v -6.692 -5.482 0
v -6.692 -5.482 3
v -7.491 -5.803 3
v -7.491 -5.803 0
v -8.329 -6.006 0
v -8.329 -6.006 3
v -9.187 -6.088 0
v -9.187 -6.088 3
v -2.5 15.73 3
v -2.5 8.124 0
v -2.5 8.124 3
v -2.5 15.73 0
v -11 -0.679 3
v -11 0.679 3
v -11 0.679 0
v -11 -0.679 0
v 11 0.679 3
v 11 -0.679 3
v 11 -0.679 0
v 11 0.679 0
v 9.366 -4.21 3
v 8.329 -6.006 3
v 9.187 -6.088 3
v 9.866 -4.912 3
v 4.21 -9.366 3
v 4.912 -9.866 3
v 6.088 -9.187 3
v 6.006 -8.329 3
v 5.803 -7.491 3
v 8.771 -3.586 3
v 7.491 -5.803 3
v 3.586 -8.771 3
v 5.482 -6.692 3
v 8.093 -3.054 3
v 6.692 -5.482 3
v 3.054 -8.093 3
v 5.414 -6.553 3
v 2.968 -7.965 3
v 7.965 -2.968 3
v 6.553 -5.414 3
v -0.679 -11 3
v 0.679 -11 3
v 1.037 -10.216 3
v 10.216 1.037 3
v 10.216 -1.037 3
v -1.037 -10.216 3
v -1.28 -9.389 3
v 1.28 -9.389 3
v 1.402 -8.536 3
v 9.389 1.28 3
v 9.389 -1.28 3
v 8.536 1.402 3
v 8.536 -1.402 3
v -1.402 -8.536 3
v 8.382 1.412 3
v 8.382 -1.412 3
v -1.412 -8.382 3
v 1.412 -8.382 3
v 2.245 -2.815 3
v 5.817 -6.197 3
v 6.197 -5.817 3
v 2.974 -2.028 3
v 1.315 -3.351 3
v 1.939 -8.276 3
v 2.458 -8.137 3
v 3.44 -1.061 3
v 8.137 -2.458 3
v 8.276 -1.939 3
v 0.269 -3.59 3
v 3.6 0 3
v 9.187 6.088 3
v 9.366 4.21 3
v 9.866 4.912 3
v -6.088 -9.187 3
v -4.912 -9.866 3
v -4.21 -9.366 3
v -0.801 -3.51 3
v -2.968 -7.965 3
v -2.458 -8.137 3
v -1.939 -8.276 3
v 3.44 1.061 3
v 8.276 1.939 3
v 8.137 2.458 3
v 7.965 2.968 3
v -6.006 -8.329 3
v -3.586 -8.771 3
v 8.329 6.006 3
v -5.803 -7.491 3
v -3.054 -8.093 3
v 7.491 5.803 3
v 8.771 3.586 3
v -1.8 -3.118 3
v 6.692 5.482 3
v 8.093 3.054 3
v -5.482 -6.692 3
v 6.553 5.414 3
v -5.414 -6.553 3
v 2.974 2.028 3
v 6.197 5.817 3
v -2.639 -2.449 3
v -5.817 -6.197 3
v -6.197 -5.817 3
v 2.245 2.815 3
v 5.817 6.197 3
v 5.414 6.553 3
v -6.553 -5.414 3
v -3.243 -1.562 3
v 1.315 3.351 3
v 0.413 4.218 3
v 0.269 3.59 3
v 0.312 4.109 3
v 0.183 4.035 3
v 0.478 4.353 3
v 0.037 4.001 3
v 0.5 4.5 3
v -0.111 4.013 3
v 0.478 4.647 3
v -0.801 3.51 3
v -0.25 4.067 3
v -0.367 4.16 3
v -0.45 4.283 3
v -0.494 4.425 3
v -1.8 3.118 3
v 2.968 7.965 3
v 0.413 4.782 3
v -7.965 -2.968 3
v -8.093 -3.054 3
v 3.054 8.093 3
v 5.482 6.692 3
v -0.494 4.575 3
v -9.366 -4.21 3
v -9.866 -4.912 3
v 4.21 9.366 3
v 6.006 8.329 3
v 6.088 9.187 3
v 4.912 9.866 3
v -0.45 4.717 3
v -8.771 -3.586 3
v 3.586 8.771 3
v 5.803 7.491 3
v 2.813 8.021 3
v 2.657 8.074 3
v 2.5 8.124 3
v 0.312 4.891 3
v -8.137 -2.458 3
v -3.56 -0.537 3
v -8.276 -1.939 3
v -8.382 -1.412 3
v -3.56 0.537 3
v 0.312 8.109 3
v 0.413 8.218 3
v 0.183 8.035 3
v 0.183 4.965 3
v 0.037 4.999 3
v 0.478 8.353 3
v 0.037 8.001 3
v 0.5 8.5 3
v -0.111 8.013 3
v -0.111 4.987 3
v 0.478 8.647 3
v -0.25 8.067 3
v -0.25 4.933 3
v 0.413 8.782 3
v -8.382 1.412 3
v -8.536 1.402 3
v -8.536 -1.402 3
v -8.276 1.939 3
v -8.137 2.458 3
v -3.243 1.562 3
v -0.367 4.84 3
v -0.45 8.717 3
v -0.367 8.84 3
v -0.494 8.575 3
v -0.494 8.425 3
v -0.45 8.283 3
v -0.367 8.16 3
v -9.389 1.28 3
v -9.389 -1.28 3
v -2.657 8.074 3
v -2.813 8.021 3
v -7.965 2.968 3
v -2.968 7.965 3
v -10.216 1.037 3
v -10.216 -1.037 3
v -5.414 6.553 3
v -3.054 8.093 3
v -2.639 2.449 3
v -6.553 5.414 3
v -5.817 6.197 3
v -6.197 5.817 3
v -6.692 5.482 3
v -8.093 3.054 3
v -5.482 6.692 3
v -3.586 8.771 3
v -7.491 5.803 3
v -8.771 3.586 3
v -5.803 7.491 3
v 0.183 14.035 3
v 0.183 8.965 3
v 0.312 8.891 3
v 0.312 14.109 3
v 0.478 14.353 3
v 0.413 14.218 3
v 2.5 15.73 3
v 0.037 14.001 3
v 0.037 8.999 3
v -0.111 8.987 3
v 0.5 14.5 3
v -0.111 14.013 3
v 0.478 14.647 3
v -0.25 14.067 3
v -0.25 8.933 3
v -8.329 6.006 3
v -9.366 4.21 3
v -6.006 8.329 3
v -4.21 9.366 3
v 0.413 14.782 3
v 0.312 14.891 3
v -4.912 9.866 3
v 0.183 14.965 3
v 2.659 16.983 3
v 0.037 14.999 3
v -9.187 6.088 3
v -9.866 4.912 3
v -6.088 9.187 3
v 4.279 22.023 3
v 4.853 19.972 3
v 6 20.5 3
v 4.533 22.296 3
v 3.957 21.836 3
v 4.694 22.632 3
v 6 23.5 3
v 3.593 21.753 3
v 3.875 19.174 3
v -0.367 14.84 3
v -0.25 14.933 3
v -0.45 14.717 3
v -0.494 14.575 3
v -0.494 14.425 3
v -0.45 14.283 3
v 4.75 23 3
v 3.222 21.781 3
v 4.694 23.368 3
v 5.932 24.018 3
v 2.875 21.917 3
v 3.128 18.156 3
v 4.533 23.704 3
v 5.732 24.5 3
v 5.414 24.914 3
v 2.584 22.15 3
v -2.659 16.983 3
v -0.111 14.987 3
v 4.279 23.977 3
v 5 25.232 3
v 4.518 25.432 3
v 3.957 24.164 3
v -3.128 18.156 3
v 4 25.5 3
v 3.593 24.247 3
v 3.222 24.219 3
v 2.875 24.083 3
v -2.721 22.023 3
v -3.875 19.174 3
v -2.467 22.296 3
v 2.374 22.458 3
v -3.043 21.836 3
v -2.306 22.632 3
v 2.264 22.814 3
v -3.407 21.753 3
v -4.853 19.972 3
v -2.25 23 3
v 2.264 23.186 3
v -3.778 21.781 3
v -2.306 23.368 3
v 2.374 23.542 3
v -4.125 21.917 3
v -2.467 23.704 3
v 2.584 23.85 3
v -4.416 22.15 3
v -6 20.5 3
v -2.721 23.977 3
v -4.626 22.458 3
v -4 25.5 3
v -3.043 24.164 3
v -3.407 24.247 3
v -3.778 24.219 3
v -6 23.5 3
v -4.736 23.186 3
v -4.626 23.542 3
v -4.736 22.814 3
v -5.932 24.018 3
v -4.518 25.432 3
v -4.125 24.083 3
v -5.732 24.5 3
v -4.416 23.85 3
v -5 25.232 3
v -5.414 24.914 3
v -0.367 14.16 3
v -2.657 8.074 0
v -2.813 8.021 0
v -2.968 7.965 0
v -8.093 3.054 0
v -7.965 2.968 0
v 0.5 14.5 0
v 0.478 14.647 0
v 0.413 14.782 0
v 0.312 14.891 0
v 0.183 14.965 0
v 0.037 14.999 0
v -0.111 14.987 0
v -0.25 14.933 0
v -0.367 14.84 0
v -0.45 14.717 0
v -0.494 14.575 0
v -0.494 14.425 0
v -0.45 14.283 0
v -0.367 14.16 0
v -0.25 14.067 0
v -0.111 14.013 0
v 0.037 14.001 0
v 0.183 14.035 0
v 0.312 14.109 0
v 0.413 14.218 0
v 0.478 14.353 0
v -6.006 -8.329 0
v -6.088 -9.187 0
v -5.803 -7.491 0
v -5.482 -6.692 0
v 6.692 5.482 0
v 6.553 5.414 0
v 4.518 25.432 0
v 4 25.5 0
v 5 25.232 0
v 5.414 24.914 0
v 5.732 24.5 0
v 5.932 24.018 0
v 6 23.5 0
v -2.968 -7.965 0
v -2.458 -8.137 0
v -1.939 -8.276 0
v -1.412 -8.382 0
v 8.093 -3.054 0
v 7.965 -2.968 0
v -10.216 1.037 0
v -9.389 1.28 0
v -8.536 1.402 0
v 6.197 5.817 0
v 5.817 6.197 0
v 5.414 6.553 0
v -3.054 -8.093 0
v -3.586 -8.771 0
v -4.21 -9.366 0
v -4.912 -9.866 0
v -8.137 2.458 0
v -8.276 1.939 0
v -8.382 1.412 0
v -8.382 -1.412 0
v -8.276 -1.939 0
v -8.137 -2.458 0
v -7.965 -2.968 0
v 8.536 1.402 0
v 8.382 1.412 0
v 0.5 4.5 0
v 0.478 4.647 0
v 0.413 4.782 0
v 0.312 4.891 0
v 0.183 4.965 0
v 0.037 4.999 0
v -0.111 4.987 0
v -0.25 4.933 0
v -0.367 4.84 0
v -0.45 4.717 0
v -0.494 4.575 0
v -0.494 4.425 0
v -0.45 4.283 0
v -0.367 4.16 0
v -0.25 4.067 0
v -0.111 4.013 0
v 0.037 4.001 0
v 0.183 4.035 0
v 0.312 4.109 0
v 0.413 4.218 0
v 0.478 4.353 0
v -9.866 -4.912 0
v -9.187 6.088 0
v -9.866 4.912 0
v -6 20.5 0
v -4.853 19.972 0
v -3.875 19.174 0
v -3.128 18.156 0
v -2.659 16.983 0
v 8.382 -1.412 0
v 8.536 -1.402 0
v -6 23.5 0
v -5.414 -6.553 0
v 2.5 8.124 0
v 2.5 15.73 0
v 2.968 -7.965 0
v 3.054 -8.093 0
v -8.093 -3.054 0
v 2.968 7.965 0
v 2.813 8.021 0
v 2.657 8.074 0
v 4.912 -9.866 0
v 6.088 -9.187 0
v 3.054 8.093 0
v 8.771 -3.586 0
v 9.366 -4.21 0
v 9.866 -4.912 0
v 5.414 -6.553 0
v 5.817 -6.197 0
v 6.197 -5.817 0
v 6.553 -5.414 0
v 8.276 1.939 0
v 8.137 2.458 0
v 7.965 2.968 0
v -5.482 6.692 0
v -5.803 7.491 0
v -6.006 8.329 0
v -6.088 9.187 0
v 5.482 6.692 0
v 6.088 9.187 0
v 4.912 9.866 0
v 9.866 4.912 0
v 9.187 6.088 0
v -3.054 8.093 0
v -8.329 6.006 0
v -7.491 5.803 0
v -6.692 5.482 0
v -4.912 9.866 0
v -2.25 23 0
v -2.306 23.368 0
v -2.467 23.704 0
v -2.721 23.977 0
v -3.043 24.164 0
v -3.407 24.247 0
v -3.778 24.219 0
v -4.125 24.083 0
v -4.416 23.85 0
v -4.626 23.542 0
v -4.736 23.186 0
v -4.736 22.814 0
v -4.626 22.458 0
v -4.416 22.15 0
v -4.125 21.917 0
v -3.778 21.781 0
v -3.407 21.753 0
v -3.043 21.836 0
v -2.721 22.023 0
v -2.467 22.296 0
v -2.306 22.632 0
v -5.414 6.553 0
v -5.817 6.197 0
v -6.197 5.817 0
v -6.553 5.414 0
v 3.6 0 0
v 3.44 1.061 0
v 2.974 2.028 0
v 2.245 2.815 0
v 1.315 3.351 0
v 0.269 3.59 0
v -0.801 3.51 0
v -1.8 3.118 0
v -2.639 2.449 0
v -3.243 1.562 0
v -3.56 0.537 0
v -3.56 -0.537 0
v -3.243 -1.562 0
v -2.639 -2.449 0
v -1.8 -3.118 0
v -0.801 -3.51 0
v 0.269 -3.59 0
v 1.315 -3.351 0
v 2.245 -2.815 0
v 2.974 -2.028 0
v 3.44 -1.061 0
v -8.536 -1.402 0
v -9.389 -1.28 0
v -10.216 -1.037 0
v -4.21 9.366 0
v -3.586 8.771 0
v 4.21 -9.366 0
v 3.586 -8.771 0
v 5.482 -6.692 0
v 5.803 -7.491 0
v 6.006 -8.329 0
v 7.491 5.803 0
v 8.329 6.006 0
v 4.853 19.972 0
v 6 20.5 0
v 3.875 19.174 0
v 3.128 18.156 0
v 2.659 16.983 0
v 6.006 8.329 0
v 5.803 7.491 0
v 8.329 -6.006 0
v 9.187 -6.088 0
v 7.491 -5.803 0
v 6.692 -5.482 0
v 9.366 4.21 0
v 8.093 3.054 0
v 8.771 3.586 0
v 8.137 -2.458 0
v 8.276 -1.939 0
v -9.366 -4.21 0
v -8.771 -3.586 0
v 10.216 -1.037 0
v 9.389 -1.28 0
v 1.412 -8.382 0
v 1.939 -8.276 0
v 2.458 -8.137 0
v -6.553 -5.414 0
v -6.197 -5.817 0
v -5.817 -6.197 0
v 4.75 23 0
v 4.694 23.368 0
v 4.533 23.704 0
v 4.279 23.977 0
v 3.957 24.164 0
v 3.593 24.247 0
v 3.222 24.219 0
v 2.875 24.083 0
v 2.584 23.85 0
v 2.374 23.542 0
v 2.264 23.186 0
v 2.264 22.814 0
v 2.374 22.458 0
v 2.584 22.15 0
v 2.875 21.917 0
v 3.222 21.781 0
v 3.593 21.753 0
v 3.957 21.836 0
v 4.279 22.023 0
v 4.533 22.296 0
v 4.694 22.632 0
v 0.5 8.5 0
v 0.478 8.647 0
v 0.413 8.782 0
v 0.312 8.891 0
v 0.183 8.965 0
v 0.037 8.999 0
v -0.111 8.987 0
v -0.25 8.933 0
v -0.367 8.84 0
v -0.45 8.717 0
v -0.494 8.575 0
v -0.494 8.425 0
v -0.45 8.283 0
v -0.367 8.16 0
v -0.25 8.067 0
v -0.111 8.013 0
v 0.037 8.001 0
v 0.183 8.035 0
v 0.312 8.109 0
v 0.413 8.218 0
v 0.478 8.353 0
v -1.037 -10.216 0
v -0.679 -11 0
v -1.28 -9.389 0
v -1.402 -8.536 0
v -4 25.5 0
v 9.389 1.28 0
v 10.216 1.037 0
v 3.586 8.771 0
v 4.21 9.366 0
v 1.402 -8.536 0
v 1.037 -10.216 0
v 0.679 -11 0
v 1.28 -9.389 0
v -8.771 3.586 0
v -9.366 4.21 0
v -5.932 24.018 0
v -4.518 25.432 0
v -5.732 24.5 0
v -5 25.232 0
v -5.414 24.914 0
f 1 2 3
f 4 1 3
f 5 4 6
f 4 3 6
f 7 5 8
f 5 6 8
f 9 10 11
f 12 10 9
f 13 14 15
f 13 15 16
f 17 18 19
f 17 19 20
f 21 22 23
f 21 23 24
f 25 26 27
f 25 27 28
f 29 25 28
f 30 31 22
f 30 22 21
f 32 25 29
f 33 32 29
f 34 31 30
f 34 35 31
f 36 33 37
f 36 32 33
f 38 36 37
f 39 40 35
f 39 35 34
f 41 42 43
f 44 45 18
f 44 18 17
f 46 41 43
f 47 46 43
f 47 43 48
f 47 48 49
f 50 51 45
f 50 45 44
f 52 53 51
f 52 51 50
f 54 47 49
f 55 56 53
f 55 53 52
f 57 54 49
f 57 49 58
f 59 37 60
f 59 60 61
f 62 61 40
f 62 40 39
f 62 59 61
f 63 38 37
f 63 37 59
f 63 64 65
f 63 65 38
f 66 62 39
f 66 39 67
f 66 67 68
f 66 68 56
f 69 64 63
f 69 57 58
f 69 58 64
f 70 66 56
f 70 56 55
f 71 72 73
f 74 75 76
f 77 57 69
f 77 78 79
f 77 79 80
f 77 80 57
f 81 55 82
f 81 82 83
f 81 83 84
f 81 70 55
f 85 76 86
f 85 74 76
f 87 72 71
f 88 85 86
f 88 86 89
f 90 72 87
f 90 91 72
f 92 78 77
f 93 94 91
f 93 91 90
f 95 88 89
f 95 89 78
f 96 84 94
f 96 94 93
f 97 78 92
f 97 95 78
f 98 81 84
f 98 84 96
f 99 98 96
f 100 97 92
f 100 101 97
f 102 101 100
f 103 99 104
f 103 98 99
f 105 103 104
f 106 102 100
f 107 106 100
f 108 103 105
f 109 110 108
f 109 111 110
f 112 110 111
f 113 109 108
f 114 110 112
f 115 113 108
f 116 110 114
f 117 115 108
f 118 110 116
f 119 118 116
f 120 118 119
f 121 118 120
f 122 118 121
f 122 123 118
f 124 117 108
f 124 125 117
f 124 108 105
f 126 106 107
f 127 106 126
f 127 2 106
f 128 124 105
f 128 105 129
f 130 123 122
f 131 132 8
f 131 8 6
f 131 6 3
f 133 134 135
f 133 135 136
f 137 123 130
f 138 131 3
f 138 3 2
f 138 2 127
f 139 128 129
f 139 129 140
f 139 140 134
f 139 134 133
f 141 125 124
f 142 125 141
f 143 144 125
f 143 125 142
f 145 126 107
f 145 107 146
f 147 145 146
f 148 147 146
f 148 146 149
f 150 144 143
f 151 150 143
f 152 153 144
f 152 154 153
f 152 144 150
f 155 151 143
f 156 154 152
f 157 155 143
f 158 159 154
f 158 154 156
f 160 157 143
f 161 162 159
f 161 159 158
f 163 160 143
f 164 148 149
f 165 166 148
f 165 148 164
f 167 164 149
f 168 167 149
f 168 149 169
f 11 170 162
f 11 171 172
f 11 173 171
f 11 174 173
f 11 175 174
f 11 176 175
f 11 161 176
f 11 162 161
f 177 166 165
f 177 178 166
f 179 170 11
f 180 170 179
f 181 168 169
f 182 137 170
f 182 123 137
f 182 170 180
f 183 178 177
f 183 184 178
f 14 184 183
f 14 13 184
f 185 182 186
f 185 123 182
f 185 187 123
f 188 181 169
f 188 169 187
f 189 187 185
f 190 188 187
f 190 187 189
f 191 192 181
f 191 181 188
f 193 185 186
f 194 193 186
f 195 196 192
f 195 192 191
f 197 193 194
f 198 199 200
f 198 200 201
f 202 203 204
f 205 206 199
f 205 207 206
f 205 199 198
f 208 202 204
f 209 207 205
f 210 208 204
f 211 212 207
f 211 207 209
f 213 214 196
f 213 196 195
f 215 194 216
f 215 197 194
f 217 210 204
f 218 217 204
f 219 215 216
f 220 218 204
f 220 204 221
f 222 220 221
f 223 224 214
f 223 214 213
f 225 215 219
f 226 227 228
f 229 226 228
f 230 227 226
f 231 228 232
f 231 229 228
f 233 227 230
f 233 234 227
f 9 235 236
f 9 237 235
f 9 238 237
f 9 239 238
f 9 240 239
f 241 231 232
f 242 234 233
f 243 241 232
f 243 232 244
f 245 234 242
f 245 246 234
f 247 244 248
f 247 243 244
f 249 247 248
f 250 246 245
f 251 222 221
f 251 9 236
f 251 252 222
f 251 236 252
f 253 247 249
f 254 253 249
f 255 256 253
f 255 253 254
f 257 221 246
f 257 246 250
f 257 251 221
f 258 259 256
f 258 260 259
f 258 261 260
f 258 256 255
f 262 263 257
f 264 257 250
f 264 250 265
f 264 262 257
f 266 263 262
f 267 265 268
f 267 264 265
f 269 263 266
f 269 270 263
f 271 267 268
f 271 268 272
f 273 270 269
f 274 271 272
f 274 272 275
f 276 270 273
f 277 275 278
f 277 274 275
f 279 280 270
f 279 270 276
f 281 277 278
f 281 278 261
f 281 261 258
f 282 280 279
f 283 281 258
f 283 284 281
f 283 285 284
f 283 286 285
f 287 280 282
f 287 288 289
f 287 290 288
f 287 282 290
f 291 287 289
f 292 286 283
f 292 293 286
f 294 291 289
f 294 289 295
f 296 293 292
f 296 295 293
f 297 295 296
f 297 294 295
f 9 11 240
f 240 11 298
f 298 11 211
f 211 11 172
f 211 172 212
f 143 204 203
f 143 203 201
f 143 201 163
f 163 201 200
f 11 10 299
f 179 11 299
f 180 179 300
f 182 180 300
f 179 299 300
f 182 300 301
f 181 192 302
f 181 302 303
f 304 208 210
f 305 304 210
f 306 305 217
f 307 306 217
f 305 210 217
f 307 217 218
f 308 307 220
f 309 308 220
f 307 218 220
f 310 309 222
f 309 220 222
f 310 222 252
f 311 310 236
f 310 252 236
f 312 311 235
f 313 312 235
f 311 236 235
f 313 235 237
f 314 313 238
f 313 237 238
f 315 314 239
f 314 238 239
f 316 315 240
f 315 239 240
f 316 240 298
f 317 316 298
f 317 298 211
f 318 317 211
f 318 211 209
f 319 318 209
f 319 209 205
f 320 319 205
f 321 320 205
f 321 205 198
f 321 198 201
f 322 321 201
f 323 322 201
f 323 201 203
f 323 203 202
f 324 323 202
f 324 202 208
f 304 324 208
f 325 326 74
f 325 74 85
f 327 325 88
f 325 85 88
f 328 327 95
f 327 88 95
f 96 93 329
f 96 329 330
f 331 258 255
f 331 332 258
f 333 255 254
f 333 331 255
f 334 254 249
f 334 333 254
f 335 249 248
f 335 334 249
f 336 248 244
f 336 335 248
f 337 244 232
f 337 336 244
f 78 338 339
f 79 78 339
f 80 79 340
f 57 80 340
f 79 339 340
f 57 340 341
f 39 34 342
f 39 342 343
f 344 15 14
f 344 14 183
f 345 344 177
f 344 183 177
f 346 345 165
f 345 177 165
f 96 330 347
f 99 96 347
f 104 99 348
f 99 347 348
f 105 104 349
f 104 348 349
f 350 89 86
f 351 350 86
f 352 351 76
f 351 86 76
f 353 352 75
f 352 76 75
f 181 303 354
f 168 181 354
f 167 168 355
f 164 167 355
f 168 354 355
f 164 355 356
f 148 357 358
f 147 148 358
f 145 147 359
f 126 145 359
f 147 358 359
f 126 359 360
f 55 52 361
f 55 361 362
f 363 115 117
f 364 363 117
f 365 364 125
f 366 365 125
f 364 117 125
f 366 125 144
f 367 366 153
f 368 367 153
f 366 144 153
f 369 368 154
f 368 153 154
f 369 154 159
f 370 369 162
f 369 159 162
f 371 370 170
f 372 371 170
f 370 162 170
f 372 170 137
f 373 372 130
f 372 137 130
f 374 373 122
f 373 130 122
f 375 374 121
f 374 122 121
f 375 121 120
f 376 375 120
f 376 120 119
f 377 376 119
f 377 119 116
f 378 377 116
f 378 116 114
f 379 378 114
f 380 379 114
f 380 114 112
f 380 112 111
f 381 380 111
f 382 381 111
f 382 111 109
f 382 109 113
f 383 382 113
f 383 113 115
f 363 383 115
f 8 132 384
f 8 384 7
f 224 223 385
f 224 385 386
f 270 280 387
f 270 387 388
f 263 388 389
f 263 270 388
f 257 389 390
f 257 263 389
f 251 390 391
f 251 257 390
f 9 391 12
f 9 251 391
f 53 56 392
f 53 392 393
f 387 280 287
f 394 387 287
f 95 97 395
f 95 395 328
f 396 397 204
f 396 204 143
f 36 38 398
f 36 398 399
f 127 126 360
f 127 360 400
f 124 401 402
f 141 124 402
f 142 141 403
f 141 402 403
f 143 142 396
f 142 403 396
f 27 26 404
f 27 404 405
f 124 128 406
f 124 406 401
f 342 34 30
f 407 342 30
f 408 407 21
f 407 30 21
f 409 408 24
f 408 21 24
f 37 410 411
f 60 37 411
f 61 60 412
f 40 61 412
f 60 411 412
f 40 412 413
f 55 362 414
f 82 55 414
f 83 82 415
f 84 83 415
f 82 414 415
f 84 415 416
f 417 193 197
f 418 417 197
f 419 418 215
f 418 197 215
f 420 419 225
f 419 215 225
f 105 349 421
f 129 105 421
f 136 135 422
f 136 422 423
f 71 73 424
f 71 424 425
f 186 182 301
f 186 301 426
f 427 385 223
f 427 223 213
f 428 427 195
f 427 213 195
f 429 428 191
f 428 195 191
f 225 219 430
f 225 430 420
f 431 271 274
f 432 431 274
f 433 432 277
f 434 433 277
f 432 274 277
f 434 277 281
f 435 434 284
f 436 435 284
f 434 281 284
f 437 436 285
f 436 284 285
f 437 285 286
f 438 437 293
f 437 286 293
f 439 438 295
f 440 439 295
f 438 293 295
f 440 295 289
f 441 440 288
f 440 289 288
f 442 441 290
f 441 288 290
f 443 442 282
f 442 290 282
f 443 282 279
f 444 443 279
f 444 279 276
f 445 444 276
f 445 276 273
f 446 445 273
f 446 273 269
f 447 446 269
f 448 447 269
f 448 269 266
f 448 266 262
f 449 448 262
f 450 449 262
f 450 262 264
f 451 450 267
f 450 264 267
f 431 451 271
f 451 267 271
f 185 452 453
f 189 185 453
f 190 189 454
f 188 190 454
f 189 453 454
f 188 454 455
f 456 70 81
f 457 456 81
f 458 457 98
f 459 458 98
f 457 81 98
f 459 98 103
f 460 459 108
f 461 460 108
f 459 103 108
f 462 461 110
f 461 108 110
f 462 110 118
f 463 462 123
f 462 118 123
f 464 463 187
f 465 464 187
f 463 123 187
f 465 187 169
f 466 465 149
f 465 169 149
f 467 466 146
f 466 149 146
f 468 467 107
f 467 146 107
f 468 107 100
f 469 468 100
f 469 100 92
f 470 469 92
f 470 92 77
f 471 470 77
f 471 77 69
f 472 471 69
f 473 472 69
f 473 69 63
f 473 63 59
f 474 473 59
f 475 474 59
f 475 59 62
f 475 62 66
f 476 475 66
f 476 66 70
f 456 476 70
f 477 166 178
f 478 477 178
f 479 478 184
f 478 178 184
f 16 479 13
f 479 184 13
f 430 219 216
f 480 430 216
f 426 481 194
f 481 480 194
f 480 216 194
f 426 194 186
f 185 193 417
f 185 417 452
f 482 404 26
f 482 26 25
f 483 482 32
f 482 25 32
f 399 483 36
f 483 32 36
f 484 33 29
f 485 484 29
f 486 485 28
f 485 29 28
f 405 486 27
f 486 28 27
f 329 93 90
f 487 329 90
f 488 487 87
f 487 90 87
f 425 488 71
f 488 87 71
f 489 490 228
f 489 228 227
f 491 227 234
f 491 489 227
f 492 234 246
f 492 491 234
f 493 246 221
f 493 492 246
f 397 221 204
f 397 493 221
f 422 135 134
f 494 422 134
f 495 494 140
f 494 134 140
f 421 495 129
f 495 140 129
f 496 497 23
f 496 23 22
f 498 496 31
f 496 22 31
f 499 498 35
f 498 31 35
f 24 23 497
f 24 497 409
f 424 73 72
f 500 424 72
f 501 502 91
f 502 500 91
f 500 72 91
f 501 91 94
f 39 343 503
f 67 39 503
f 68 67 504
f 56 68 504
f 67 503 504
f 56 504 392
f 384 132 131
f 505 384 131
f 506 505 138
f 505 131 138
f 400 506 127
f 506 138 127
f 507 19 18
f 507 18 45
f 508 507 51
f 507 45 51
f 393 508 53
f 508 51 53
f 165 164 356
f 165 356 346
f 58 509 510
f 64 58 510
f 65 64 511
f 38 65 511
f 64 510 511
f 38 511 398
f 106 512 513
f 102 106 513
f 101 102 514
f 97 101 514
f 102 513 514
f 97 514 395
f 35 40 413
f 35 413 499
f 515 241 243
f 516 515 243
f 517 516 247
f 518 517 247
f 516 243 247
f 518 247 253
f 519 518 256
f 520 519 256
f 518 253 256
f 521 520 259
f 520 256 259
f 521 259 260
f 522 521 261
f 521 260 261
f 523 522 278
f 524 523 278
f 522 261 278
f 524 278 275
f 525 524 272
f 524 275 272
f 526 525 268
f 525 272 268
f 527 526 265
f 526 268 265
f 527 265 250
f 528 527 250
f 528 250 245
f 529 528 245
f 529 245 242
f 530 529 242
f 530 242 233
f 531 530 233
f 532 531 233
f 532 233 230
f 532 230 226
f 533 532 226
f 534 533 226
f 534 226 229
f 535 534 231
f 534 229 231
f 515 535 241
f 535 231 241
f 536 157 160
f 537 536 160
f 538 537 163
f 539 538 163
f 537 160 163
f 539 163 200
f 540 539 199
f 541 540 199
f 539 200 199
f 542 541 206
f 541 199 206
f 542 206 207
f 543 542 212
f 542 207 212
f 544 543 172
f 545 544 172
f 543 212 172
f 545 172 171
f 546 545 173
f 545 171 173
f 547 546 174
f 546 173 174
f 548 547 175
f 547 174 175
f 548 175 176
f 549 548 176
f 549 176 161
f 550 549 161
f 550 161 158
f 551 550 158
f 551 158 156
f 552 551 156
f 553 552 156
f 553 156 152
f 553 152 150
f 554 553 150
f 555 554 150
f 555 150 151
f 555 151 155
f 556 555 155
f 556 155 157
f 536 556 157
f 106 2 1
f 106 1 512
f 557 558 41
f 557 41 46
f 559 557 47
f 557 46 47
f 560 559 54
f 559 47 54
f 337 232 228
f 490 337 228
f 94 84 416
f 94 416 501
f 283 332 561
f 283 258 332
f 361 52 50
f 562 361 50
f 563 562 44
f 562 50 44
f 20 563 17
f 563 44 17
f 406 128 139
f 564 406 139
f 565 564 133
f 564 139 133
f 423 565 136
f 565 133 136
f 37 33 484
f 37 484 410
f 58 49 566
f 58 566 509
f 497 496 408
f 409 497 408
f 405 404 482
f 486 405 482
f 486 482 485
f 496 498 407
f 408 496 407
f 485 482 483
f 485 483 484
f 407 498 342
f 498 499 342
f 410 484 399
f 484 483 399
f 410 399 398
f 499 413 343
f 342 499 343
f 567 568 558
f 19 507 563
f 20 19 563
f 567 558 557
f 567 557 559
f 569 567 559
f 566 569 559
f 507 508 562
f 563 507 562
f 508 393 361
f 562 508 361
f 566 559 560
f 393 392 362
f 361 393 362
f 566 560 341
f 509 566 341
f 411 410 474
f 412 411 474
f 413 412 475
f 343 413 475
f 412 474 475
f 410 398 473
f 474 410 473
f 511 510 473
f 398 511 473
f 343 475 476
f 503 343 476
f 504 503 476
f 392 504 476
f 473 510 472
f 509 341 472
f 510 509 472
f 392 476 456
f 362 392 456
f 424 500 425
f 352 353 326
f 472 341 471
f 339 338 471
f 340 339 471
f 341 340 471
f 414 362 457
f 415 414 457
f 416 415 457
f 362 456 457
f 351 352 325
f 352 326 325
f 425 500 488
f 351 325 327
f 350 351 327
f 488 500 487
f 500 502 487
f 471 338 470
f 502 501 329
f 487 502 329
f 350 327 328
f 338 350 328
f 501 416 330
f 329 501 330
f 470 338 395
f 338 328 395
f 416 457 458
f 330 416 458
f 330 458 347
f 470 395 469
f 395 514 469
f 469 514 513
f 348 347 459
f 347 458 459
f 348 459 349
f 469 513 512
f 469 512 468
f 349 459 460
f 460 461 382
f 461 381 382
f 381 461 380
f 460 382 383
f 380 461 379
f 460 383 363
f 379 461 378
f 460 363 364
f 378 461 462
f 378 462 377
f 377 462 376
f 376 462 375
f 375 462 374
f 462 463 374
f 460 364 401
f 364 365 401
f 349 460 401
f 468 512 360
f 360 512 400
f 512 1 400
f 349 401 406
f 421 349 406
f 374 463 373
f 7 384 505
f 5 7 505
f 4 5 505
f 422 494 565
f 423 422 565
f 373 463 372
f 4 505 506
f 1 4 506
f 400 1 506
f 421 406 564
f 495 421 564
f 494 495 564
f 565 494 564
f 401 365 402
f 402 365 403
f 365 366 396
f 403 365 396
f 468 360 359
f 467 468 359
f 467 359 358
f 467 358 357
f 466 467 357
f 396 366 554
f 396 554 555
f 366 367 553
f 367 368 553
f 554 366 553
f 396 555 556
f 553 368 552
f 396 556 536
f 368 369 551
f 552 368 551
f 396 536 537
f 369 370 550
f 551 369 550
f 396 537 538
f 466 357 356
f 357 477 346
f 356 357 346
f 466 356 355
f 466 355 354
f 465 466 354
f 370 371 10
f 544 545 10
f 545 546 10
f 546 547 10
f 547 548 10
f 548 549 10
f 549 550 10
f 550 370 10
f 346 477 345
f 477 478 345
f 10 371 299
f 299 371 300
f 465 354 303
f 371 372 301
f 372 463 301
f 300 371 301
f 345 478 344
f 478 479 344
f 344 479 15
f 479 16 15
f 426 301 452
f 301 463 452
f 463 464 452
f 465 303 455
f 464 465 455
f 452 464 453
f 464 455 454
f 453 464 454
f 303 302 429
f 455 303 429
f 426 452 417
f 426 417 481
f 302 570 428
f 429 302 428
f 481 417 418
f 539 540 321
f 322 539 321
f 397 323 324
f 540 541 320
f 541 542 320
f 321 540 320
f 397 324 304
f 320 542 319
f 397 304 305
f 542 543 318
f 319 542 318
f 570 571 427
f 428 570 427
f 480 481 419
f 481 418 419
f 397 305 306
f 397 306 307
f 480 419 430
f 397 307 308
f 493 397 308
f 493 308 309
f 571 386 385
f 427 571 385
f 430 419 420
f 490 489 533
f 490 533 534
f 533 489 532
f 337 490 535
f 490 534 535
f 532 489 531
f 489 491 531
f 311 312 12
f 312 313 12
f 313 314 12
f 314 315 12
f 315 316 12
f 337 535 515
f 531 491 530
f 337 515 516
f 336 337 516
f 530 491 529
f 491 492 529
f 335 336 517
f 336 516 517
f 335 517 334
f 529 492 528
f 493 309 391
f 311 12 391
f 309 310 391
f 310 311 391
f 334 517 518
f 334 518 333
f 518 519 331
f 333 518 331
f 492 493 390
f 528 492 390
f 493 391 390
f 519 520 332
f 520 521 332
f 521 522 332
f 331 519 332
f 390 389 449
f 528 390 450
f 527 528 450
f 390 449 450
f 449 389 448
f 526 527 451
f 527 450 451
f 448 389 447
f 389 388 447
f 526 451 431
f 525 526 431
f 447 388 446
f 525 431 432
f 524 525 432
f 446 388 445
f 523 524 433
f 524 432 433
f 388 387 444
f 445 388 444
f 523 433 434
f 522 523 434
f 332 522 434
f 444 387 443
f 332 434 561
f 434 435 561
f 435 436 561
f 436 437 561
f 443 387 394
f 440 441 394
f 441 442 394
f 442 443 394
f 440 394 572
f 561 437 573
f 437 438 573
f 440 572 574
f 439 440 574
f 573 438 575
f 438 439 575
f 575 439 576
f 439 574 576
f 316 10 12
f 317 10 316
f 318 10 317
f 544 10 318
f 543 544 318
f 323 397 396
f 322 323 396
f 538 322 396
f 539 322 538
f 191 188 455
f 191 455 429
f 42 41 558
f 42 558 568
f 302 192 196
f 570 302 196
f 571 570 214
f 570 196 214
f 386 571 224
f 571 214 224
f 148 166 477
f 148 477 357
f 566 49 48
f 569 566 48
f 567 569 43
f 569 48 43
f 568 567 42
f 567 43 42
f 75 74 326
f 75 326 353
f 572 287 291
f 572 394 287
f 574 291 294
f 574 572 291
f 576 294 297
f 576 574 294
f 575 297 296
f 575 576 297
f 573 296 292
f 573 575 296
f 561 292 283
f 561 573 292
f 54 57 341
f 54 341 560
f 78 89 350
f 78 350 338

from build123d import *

# Parameters (mm, degrees)
SKETCH1_R           = 8.5
BOSS_EXTRUDE1_DEPTH = 3
BOSS_EXTRUDE2_DEPTH = 3
CIRPATTERN2_COUNT   = 12
FILLET5_R           = 6
FILLET6_R           = 6
BOSS_EXTRUDE3_DEPTH = 3
FILLET9_R           = 2.5
SKETCH20_R          = 3.6
CUT_EXTRUDE11_DEPTH = 10
SKETCH21_R          = 0.5
CUT_EXTRUDE12_DEPTH = 10
BOSS_EXTRUDE4_DEPTH = 3
SKETCH23_R          = 1.25
CUT_EXTRUDE13_DEPTH = 3
FILLET10_R          = 5
FILLET11_R          = 2


# Some blends are built 0.0001 mm under size
with BuildPart() as part:
    # Sketch1 → Boss-Extrude1 (new body)
    with BuildSketch(Plane.XY):
        Circle(SKETCH1_R)
    extrude(amount=BOSS_EXTRUDE1_DEPTH)

    # Sketch3 → Boss-Extrude2 (add)
    with BuildSketch(Plane.XY.offset(3)):
        Polygon((-1.305261922, 9.914448614), (-1.509060022, 7), (1.509060022, 7), (1.305261922, 9.914448614), (0.678518537, 11), (-0.678518537, 11), align=None)
    boss_extrude2 = extrude(amount=-BOSS_EXTRUDE2_DEPTH)

    # CirPattern2: Boss-Extrude2 ×12 about axis
    cirpattern2_axis = Axis((0, 0, 0), (0, 0, 1))
    for i in range(1, CIRPATTERN2_COUNT):
        add(boss_extrude2.rotate(cirpattern2_axis, i * 360 / CIRPATTERN2_COUNT))

    # Fillet5
    # the kernel refuses this fillet: 6 mm, written as the material it takes off along each edge
    with BuildSketch(Plane(origin=(9.238795325, 3.826834324, 6.454382408), x_dir=(0.4999999999998129, 0.8660254037845467, 0), z_dir=(0, 0, -1)), Plane(origin=(1.305261922, 9.914448614, 6.454382408), x_dir=(-0.5000000000001841, 0.8660254037843323, 0), z_dir=(0, 0, -1)), Plane(origin=(-7.933533403, 6.08761429, 6.454382408), x_dir=(-1, 0, 0), z_dir=(0, 0, -1)), Plane(origin=(-9.914448614, 1.305261922, 6.454382408), x_dir=(-0.8660254037843317, -0.5000000000001852, 0), z_dir=(0, 0, -1)), Plane(origin=(-9.238795325, -3.826834324, 6.454382408), x_dir=(-0.49999999999981826, -0.8660254037845436, 0), z_dir=(0, 0, -1)), Plane(origin=(-6.08761429, -7.933533403, 6.454382408), x_dir=(0, -1, 0), z_dir=(0, 0, -1)), Plane(origin=(3.826834324, -9.238795325, 6.454382408), x_dir=(0.866025403784545, -0.49999999999981576, 0), z_dir=(0, 0, -1)), Plane(origin=(7.933533403, -6.08761429, 6.454382408), x_dir=(1, 0, 0), z_dir=(0, 0, -1)), Plane(origin=(9.914448614, -1.305261922, 6.454382408), x_dir=(0.8660254037843321, 0.5000000000001844, 0), z_dir=(0, 0, -1))) as fillet5_piece_1:
        with BuildLine():
            CenterArc((1.388315544, -5.998484909), FILLET5_R, 91.287628333, 24.712371667)
            Line((-1.241911337, -0.605720631), (-1.294515874, -0.497865346))
            Line((-1.294515874, -0.497865346), (-0.052604538, 0.107855286))
            Line((-0.052604538, 0.107855286), (0, 0.12))
            ThreePointArc((0, 0.12), (0.626743385, 0.12), (1.250790195, 0.119969698))
            Line((1.250790195, 0.119969698), (1.25348677, 0))
        make_face()
    extrude(amount=9.908764816, mode=Mode.SUBTRACT)
    with BuildSketch(Plane(origin=(6.08761429, 7.933533403, 6.454382408), x_dir=(-0.4383711467890806, -0.8987940462991654, 0), z_dir=(0, 0, -1)), Plane(origin=(-3.826834324, 9.238795325, 6.454382408), x_dir=(0.5591929034707435, -0.8290375725550441, 0), z_dir=(0, 0, -1)), Plane(origin=(-1.305261922, -9.914448614, 6.454382408), x_dir=(-0.06975647374412178, 0.9975640502598244, 0), z_dir=(0, 0, -1))) as fillet5_piece_2:
        with BuildLine():
            CenterArc((1.381752963, 6), FILLET5_R, 245.287628333, 24.712371667)
            Line((-1.126626446, 0.549492433), (-1.176794034, 0.440482282))
            ThreePointArc((-1.176794034, 0.440482282), (-0.615917761, 0.166890931), (-0.052604538, -0.107855286))
            Line((-0.052604538, -0.107855286), (0, -0.12))
            Line((0, -0.12), (1.381752963, -0.12))
            Line((1.381752963, -0.12), (1.381752963, 0))
        make_face()
    extrude(amount=9.908764816, mode=Mode.SUBTRACT)

    # Fillet6
    # the kernel refuses this fillet: 6 mm, written as the material it takes off along each edge
    with BuildSketch(Plane(origin=(7.933533403, 6.08761429, 6.454382408), x_dir=(-0.8987940462991681, -0.4383711467890748, 0), z_dir=(0, 0, -1)), Plane(origin=(3.826834324, 9.238795325, 6.454382408), x_dir=(-0.5591929034707512, -0.8290375725550386, 0), z_dir=(0, 0, -1)), Plane(origin=(-1.305261922, 9.914448614, 6.454382408), x_dir=(-0.06975647374412959, -0.9975640502598239, 0), z_dir=(0, 0, -1)), Plane(origin=(-6.08761429, 7.933533403, 6.454382408), x_dir=(0.43837114678907496, -0.8987940462991681, 0), z_dir=(0, 0, -1)), Plane(origin=(-9.238795325, 3.826834324, 6.454382408), x_dir=(0.8290375725550394, -0.5591929034707502, 0), z_dir=(0, 0, -1)), Plane(origin=(-9.914448614, -1.305261922, 6.454382408), x_dir=(0.9975640502598241, -0.06975647374412908, 0), z_dir=(0, 0, -1)), Plane(origin=(-7.933533403, -6.08761429, 6.454382408), x_dir=(0.8987940462991686, 0.4383711467890744, 0), z_dir=(0, 0, -1)), Plane(origin=(-3.826834324, -9.238795325, 6.454382408), x_dir=(0.559192903470749, 0.8290375725550401, 0), z_dir=(0, 0, -1)), Plane(origin=(1.305261922, -9.914448614, 6.454382408), x_dir=(0.06975647374412973, 0.9975640502598241, 0), z_dir=(0, 0, -1)), Plane(origin=(6.08761429, -7.933533403, 6.454382408), x_dir=(-0.4383711467890742, 0.8987940462991686, 0), z_dir=(0, 0, -1)), Plane(origin=(9.238795325, -3.826834324, 6.454382408), x_dir=(-0.8290375725550386, 0.5591929034707512, 0), z_dir=(0, 0, -1)), Plane(origin=(9.914448614, 1.305261922, 6.454382408), x_dir=(-0.9975640502598239, 0.06975647374412945, 0), z_dir=(0, 0, -1))) as fillet6_piece_1:
        with BuildLine():
            CenterArc((1.381752963, -6), FILLET6_R, 90, 24.712371667)
            Line((-1.126626446, -0.549492433), (-1.176794034, -0.440482282))
            ThreePointArc((-1.176794034, -0.440482282), (-0.615917761, -0.166890931), (-0.052604538, 0.107855286))
            Line((-0.052604538, 0.107855286), (0, 0.12))
            Line((0, 0.12), (1.381752963, 0.12))
            Line((1.381752963, 0.12), (1.381752963, 0))
        make_face()
    extrude(amount=9.908764816, mode=Mode.SUBTRACT)

    # Sketch4 → Boss-Extrude3 (add)
    with BuildSketch(Plane(origin=(0, 0, 0), x_dir=(-1, 0, 0), z_dir=(0, 0, -1))):
        with BuildLine():
            Line((-2.5, 25.5), (-2.5, 4.330127019))
            ThreePointArc((-2.5, 4.330127019), (-5, 0), (-2.5, -4.330127019))
            Line((-2.5, -4.330127019), (-2.5, -7))
            Line((-2.5, -7), (2.5, -7))
            Line((2.5, -7), (2.5, -4.330127019))
            ThreePointArc((2.5, -4.330127019), (5, 0), (2.5, 4.330127019))
            Line((2.5, 4.330127019), (2.5, 25.5))
            Line((2.5, 25.5), (-2.5, 25.5))
        make_face()
    extrude(amount=-BOSS_EXTRUDE3_DEPTH)

    # Fillet9
    fillet9_edges = [part.edges().sort_by_distance(p)[0] for p in [
        (-2.5, 25.5, 1.5),
        (2.5, 25.5, 1.5),
    ]]
    fillet(fillet9_edges, radius=FILLET9_R - 0.0001)  # a hair under: the kernel refuses the full size

    # Sketch20 → Cut-Extrude11 (cut)
    with BuildSketch(Plane.XY.offset(3)):
        Circle(SKETCH20_R)
    extrude(amount=-CUT_EXTRUDE11_DEPTH, mode=Mode.SUBTRACT)

    # Sketch21 → Cut-Extrude12 (cut)
    with BuildSketch(Plane.XY.offset(3)):
        with Locations((0, 14.5)):
            Circle(SKETCH21_R)
        with Locations((0, 4.5)):
            Circle(SKETCH21_R)
        with Locations((0, 8.5)):
            Circle(SKETCH21_R)
    extrude(amount=-CUT_EXTRUDE12_DEPTH, mode=Mode.SUBTRACT)

    # Sketch22 → Boss-Extrude4 (add)
    with BuildSketch(Plane.XY.offset(3)):
        Polygon((0, 25.5), (6, 25.5), (6, 20.5), (-6, 20.5), (-6, 25.5), align=None)
    extrude(amount=-BOSS_EXTRUDE4_DEPTH)

    # Sketch23 → Cut-Extrude13 (cut)
    with BuildSketch(Plane.XY.offset(3)):
        with Locations((-3.5, 23)):
            Circle(SKETCH23_R)
        with Locations((3.5, 23)):
            Circle(SKETCH23_R)
    extrude(amount=-CUT_EXTRUDE13_DEPTH, mode=Mode.SUBTRACT)

    # Fillet10
    # the kernel refuses this fillet: 5 mm, written as the material it adds along each edge
    with BuildSketch(Plane(origin=(2.5, 20.5, 0), x_dir=(1, 0, 0), z_dir=(0, 0, 1))) as fillet10_piece_1:
        with BuildLine():
            CenterArc((5, -4.769696007), FILLET10_R, 107.457603124, 72.542396876)
            Line((0, -4.769696007), (-0.1, -4.769696007))
            Line((-0.1, -4.769696007), (-0.1, 0))
            Line((-0.1, 0), (0, 0.1))
            ThreePointArc((0, 0.1), (1.75, 0.1), (3.47, 0.09539392))
            Line((3.47, 0.09539392), (3.5, 0))
        make_face()
    extrude(amount=3)
    with BuildSketch(Plane(origin=(-2.5, 20.5, 3), x_dir=(0, -1, 0), z_dir=(0, 0, -1))) as fillet10_piece_2:
        with BuildLine():
            CenterArc((4.769696007, 5), FILLET10_R, 197.457603124, 72.542396876)
            Line((0, 3.5), (-0.09539392, 3.47))
            ThreePointArc((-0.09539392, 3.47), (-0.1, 1.75), (-0.1, 0))
            Line((-0.1, 0), (0, -0.1))
            Line((0, -0.1), (4.769696007, -0.1))
            Line((4.769696007, -0.1), (4.769696007, 0))
        make_face()
    extrude(amount=3)

    # Fillet11
    fillet11_edges = [part.edges().sort_by_distance(p)[0] for p in [
        (-6, 25.5, 1.5),
        (6, 25.5, 1.5),
    ]]
    fillet(fillet11_edges, radius=FILLET11_R)


solid = part.part
